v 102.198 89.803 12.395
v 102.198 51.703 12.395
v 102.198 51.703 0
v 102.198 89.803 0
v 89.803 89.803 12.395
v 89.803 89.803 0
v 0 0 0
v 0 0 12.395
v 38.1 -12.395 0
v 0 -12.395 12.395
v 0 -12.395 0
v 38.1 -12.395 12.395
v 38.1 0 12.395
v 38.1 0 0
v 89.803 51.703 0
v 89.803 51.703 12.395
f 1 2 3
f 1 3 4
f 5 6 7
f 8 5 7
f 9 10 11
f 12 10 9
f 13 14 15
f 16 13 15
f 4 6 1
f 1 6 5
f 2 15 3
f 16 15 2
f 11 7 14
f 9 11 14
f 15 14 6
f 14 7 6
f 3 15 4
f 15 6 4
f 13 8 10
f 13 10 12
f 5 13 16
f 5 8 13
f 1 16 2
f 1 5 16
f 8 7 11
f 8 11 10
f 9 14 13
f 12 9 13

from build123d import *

# Parameters (mm, degrees)
F1_DEPTH = 12.3952
F2_W     = 38.1
F2_H     = 12.3952
F3_DEPTH = 12.3952
F4_W     = 38.1
F4_H     = 12.3952
F5_DEPTH = 12.3952


with BuildPart() as f1:
    # F0 (on Top) → F1 (new body)
    with BuildSketch(Plane.XY):
        Polygon((89.802561, 89.802561), (0, 0), (38.1, 0), (89.802561, 51.702561), align=None)
    extrude(amount=F1_DEPTH)

    # F2 (on face) → F3 (join)
    with BuildSketch(Plane.YZ.offset(89.802561)):
        with Locations((70.752561, 6.1976)):
            Rectangle(F2_W, F2_H)
    extrude(amount=F3_DEPTH)

    # F4 (on face) → F5 (join)
    with BuildSketch(Plane.XZ):
        with Locations((19.05, 6.1976)):
            Rectangle(F4_W, F4_H)
    extrude(amount=F5_DEPTH)


solid = f1.part
